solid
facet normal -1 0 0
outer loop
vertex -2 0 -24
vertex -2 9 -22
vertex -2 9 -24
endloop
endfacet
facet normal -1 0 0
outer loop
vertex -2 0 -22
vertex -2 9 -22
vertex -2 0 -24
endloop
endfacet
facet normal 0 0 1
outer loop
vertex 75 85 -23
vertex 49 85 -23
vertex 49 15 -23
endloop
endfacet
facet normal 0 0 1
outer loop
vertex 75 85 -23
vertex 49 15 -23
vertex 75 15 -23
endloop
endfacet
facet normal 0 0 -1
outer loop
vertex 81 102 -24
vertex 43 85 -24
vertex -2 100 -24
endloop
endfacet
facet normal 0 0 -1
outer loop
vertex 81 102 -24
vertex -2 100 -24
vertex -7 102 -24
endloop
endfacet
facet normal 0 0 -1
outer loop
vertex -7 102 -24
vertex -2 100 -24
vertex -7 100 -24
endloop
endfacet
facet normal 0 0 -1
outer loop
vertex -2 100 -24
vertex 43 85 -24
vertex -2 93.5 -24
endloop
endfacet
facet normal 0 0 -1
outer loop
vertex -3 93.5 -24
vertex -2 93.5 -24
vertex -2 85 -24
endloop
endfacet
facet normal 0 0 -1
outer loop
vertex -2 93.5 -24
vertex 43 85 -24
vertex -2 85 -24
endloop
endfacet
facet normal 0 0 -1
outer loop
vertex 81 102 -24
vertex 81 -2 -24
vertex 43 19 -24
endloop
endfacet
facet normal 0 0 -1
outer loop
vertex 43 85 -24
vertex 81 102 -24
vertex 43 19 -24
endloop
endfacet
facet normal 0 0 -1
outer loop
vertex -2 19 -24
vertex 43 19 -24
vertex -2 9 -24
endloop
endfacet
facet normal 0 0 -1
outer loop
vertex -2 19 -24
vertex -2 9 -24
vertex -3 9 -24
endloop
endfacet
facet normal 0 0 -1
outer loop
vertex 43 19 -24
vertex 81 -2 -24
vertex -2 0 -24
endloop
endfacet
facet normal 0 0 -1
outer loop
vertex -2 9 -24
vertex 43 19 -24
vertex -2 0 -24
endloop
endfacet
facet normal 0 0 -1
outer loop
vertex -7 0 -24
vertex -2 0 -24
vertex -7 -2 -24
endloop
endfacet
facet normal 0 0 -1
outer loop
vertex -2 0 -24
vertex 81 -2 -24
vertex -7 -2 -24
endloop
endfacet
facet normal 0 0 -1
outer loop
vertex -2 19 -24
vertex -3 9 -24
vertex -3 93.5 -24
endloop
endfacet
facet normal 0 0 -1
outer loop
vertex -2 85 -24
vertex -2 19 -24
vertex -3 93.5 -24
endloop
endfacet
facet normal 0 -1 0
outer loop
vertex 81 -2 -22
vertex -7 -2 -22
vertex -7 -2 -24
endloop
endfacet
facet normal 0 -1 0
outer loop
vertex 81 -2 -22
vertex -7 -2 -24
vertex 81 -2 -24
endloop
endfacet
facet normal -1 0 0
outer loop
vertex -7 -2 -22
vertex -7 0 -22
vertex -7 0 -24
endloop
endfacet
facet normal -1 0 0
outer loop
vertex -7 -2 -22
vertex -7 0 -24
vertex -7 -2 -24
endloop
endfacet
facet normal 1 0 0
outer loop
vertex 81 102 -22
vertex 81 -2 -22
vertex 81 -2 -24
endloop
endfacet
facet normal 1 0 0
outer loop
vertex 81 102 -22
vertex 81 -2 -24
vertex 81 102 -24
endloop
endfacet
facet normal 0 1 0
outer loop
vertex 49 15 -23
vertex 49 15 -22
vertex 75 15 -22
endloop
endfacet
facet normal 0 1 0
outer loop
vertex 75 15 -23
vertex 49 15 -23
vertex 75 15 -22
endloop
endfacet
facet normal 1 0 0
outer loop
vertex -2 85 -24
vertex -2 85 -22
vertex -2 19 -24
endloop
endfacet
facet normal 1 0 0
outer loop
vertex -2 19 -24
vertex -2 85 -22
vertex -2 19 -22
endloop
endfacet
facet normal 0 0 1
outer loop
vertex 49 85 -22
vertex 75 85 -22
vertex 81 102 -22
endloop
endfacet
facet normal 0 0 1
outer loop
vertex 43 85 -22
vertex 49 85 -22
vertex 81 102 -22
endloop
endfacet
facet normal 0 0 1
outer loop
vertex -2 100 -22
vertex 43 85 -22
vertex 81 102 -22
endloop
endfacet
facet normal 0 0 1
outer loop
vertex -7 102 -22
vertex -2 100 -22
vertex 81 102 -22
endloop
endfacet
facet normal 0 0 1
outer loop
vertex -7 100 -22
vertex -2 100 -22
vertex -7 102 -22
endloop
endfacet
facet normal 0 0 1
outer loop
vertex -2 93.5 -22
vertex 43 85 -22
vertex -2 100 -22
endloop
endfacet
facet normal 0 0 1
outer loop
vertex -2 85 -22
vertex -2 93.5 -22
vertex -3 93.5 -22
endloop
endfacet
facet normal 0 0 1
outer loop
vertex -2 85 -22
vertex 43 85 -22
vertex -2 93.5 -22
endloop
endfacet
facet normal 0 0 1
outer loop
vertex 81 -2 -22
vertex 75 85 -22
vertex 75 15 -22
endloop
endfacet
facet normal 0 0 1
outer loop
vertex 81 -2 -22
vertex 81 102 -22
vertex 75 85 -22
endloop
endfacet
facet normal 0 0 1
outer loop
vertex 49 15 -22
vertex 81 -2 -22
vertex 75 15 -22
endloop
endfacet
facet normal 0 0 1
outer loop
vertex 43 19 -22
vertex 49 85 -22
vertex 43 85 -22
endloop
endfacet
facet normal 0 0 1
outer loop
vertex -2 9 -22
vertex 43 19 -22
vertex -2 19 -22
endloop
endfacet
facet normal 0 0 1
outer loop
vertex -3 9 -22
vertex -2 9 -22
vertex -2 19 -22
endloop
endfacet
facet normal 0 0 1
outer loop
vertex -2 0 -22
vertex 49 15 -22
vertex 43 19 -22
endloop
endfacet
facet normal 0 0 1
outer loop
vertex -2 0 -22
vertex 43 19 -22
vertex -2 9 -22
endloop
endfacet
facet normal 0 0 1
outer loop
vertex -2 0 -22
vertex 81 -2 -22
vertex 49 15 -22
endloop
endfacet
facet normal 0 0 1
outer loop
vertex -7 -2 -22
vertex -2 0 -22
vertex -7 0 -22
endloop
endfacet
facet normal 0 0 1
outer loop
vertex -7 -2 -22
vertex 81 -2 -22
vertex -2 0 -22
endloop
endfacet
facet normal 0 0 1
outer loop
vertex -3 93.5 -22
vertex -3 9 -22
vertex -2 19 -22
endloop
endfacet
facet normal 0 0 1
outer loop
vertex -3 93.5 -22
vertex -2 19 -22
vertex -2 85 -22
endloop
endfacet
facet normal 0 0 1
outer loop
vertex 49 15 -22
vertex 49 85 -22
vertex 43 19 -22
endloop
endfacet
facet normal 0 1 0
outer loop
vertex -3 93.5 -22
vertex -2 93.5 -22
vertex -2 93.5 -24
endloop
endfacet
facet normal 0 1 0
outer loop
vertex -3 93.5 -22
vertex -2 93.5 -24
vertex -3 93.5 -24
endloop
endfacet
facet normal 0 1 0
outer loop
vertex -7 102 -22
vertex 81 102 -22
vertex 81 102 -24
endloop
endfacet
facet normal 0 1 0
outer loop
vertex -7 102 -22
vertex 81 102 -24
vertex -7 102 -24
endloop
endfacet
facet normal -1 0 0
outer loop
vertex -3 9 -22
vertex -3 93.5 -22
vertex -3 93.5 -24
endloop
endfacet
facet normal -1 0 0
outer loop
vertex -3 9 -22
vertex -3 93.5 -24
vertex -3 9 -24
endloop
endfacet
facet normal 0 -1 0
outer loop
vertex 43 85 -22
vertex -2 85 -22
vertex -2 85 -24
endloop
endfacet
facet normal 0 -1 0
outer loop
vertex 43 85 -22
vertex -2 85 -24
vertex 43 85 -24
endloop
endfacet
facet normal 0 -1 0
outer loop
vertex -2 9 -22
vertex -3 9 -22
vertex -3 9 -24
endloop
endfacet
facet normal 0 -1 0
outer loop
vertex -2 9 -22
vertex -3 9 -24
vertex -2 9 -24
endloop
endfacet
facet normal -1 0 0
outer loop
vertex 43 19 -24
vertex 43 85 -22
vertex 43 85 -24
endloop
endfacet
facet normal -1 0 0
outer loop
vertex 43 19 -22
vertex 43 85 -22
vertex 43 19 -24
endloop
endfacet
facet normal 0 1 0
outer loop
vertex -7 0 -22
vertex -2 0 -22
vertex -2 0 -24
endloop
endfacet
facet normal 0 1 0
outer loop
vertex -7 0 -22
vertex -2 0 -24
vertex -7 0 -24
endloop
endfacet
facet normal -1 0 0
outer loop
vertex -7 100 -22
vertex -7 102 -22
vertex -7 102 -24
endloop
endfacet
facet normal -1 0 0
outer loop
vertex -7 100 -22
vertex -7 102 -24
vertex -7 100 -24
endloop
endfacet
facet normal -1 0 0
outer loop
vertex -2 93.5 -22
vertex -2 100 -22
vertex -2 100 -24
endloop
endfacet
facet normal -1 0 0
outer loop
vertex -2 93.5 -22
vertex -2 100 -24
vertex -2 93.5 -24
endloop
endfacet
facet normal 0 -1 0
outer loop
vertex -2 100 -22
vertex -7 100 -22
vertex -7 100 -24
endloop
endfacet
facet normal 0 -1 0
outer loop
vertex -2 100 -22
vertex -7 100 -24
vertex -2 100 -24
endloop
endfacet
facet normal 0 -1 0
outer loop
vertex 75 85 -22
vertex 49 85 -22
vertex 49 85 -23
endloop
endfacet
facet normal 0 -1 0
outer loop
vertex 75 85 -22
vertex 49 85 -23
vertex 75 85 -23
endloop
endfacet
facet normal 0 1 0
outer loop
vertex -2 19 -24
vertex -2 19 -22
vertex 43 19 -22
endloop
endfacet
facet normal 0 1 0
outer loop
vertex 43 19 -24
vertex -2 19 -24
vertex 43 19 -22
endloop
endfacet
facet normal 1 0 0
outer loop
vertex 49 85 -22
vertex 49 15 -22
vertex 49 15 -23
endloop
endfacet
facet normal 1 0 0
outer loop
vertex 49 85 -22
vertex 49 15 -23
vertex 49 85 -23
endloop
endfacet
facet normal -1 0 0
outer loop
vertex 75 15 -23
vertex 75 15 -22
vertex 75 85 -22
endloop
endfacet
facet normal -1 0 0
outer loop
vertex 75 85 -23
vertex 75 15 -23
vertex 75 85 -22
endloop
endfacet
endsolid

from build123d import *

# Parameters (mm, degrees)
SKETCH093_W      = 26
SKETCH093_H      = 70
EXTRUDE081_DEPTH = 1
SKETCH_W         = 45
SKETCH_H         = 66
EXTRUDE_DEPTH    = 2


with BuildPart() as extrude081:
    # Sketch093 → Extrude081 (new body, symmetric)
    with BuildSketch(Plane.XY.offset(-22)):
        with Locations((62, 50)):
            Rectangle(SKETCH093_W, SKETCH093_H)
    extrude(amount=EXTRUDE081_DEPTH, both=True)


with BuildPart() as cut012:
    # Sketch → Extrude (new body)
    with BuildSketch(Plane(origin=(0, 0, -22), x_dir=(1, 0, 0), z_dir=(0, 0, -1))):
        Polygon((-7, 2), (81, 2), (81, -102), (-7, -102), (-7, -100), (-2, -100), (-2, -93.5), (-3, -93.5), (-3, -9), (-2, -9), (-2, 0), (-7, 0), align=None)
        with Locations((20.5, -52)):
            Rectangle(SKETCH_W, SKETCH_H, mode=Mode.SUBTRACT)
    extrude(amount=EXTRUDE_DEPTH)

    # Cut012: cut Extrude081
    add(extrude081.part, mode=Mode.SUBTRACT)


solid = cut012.part
